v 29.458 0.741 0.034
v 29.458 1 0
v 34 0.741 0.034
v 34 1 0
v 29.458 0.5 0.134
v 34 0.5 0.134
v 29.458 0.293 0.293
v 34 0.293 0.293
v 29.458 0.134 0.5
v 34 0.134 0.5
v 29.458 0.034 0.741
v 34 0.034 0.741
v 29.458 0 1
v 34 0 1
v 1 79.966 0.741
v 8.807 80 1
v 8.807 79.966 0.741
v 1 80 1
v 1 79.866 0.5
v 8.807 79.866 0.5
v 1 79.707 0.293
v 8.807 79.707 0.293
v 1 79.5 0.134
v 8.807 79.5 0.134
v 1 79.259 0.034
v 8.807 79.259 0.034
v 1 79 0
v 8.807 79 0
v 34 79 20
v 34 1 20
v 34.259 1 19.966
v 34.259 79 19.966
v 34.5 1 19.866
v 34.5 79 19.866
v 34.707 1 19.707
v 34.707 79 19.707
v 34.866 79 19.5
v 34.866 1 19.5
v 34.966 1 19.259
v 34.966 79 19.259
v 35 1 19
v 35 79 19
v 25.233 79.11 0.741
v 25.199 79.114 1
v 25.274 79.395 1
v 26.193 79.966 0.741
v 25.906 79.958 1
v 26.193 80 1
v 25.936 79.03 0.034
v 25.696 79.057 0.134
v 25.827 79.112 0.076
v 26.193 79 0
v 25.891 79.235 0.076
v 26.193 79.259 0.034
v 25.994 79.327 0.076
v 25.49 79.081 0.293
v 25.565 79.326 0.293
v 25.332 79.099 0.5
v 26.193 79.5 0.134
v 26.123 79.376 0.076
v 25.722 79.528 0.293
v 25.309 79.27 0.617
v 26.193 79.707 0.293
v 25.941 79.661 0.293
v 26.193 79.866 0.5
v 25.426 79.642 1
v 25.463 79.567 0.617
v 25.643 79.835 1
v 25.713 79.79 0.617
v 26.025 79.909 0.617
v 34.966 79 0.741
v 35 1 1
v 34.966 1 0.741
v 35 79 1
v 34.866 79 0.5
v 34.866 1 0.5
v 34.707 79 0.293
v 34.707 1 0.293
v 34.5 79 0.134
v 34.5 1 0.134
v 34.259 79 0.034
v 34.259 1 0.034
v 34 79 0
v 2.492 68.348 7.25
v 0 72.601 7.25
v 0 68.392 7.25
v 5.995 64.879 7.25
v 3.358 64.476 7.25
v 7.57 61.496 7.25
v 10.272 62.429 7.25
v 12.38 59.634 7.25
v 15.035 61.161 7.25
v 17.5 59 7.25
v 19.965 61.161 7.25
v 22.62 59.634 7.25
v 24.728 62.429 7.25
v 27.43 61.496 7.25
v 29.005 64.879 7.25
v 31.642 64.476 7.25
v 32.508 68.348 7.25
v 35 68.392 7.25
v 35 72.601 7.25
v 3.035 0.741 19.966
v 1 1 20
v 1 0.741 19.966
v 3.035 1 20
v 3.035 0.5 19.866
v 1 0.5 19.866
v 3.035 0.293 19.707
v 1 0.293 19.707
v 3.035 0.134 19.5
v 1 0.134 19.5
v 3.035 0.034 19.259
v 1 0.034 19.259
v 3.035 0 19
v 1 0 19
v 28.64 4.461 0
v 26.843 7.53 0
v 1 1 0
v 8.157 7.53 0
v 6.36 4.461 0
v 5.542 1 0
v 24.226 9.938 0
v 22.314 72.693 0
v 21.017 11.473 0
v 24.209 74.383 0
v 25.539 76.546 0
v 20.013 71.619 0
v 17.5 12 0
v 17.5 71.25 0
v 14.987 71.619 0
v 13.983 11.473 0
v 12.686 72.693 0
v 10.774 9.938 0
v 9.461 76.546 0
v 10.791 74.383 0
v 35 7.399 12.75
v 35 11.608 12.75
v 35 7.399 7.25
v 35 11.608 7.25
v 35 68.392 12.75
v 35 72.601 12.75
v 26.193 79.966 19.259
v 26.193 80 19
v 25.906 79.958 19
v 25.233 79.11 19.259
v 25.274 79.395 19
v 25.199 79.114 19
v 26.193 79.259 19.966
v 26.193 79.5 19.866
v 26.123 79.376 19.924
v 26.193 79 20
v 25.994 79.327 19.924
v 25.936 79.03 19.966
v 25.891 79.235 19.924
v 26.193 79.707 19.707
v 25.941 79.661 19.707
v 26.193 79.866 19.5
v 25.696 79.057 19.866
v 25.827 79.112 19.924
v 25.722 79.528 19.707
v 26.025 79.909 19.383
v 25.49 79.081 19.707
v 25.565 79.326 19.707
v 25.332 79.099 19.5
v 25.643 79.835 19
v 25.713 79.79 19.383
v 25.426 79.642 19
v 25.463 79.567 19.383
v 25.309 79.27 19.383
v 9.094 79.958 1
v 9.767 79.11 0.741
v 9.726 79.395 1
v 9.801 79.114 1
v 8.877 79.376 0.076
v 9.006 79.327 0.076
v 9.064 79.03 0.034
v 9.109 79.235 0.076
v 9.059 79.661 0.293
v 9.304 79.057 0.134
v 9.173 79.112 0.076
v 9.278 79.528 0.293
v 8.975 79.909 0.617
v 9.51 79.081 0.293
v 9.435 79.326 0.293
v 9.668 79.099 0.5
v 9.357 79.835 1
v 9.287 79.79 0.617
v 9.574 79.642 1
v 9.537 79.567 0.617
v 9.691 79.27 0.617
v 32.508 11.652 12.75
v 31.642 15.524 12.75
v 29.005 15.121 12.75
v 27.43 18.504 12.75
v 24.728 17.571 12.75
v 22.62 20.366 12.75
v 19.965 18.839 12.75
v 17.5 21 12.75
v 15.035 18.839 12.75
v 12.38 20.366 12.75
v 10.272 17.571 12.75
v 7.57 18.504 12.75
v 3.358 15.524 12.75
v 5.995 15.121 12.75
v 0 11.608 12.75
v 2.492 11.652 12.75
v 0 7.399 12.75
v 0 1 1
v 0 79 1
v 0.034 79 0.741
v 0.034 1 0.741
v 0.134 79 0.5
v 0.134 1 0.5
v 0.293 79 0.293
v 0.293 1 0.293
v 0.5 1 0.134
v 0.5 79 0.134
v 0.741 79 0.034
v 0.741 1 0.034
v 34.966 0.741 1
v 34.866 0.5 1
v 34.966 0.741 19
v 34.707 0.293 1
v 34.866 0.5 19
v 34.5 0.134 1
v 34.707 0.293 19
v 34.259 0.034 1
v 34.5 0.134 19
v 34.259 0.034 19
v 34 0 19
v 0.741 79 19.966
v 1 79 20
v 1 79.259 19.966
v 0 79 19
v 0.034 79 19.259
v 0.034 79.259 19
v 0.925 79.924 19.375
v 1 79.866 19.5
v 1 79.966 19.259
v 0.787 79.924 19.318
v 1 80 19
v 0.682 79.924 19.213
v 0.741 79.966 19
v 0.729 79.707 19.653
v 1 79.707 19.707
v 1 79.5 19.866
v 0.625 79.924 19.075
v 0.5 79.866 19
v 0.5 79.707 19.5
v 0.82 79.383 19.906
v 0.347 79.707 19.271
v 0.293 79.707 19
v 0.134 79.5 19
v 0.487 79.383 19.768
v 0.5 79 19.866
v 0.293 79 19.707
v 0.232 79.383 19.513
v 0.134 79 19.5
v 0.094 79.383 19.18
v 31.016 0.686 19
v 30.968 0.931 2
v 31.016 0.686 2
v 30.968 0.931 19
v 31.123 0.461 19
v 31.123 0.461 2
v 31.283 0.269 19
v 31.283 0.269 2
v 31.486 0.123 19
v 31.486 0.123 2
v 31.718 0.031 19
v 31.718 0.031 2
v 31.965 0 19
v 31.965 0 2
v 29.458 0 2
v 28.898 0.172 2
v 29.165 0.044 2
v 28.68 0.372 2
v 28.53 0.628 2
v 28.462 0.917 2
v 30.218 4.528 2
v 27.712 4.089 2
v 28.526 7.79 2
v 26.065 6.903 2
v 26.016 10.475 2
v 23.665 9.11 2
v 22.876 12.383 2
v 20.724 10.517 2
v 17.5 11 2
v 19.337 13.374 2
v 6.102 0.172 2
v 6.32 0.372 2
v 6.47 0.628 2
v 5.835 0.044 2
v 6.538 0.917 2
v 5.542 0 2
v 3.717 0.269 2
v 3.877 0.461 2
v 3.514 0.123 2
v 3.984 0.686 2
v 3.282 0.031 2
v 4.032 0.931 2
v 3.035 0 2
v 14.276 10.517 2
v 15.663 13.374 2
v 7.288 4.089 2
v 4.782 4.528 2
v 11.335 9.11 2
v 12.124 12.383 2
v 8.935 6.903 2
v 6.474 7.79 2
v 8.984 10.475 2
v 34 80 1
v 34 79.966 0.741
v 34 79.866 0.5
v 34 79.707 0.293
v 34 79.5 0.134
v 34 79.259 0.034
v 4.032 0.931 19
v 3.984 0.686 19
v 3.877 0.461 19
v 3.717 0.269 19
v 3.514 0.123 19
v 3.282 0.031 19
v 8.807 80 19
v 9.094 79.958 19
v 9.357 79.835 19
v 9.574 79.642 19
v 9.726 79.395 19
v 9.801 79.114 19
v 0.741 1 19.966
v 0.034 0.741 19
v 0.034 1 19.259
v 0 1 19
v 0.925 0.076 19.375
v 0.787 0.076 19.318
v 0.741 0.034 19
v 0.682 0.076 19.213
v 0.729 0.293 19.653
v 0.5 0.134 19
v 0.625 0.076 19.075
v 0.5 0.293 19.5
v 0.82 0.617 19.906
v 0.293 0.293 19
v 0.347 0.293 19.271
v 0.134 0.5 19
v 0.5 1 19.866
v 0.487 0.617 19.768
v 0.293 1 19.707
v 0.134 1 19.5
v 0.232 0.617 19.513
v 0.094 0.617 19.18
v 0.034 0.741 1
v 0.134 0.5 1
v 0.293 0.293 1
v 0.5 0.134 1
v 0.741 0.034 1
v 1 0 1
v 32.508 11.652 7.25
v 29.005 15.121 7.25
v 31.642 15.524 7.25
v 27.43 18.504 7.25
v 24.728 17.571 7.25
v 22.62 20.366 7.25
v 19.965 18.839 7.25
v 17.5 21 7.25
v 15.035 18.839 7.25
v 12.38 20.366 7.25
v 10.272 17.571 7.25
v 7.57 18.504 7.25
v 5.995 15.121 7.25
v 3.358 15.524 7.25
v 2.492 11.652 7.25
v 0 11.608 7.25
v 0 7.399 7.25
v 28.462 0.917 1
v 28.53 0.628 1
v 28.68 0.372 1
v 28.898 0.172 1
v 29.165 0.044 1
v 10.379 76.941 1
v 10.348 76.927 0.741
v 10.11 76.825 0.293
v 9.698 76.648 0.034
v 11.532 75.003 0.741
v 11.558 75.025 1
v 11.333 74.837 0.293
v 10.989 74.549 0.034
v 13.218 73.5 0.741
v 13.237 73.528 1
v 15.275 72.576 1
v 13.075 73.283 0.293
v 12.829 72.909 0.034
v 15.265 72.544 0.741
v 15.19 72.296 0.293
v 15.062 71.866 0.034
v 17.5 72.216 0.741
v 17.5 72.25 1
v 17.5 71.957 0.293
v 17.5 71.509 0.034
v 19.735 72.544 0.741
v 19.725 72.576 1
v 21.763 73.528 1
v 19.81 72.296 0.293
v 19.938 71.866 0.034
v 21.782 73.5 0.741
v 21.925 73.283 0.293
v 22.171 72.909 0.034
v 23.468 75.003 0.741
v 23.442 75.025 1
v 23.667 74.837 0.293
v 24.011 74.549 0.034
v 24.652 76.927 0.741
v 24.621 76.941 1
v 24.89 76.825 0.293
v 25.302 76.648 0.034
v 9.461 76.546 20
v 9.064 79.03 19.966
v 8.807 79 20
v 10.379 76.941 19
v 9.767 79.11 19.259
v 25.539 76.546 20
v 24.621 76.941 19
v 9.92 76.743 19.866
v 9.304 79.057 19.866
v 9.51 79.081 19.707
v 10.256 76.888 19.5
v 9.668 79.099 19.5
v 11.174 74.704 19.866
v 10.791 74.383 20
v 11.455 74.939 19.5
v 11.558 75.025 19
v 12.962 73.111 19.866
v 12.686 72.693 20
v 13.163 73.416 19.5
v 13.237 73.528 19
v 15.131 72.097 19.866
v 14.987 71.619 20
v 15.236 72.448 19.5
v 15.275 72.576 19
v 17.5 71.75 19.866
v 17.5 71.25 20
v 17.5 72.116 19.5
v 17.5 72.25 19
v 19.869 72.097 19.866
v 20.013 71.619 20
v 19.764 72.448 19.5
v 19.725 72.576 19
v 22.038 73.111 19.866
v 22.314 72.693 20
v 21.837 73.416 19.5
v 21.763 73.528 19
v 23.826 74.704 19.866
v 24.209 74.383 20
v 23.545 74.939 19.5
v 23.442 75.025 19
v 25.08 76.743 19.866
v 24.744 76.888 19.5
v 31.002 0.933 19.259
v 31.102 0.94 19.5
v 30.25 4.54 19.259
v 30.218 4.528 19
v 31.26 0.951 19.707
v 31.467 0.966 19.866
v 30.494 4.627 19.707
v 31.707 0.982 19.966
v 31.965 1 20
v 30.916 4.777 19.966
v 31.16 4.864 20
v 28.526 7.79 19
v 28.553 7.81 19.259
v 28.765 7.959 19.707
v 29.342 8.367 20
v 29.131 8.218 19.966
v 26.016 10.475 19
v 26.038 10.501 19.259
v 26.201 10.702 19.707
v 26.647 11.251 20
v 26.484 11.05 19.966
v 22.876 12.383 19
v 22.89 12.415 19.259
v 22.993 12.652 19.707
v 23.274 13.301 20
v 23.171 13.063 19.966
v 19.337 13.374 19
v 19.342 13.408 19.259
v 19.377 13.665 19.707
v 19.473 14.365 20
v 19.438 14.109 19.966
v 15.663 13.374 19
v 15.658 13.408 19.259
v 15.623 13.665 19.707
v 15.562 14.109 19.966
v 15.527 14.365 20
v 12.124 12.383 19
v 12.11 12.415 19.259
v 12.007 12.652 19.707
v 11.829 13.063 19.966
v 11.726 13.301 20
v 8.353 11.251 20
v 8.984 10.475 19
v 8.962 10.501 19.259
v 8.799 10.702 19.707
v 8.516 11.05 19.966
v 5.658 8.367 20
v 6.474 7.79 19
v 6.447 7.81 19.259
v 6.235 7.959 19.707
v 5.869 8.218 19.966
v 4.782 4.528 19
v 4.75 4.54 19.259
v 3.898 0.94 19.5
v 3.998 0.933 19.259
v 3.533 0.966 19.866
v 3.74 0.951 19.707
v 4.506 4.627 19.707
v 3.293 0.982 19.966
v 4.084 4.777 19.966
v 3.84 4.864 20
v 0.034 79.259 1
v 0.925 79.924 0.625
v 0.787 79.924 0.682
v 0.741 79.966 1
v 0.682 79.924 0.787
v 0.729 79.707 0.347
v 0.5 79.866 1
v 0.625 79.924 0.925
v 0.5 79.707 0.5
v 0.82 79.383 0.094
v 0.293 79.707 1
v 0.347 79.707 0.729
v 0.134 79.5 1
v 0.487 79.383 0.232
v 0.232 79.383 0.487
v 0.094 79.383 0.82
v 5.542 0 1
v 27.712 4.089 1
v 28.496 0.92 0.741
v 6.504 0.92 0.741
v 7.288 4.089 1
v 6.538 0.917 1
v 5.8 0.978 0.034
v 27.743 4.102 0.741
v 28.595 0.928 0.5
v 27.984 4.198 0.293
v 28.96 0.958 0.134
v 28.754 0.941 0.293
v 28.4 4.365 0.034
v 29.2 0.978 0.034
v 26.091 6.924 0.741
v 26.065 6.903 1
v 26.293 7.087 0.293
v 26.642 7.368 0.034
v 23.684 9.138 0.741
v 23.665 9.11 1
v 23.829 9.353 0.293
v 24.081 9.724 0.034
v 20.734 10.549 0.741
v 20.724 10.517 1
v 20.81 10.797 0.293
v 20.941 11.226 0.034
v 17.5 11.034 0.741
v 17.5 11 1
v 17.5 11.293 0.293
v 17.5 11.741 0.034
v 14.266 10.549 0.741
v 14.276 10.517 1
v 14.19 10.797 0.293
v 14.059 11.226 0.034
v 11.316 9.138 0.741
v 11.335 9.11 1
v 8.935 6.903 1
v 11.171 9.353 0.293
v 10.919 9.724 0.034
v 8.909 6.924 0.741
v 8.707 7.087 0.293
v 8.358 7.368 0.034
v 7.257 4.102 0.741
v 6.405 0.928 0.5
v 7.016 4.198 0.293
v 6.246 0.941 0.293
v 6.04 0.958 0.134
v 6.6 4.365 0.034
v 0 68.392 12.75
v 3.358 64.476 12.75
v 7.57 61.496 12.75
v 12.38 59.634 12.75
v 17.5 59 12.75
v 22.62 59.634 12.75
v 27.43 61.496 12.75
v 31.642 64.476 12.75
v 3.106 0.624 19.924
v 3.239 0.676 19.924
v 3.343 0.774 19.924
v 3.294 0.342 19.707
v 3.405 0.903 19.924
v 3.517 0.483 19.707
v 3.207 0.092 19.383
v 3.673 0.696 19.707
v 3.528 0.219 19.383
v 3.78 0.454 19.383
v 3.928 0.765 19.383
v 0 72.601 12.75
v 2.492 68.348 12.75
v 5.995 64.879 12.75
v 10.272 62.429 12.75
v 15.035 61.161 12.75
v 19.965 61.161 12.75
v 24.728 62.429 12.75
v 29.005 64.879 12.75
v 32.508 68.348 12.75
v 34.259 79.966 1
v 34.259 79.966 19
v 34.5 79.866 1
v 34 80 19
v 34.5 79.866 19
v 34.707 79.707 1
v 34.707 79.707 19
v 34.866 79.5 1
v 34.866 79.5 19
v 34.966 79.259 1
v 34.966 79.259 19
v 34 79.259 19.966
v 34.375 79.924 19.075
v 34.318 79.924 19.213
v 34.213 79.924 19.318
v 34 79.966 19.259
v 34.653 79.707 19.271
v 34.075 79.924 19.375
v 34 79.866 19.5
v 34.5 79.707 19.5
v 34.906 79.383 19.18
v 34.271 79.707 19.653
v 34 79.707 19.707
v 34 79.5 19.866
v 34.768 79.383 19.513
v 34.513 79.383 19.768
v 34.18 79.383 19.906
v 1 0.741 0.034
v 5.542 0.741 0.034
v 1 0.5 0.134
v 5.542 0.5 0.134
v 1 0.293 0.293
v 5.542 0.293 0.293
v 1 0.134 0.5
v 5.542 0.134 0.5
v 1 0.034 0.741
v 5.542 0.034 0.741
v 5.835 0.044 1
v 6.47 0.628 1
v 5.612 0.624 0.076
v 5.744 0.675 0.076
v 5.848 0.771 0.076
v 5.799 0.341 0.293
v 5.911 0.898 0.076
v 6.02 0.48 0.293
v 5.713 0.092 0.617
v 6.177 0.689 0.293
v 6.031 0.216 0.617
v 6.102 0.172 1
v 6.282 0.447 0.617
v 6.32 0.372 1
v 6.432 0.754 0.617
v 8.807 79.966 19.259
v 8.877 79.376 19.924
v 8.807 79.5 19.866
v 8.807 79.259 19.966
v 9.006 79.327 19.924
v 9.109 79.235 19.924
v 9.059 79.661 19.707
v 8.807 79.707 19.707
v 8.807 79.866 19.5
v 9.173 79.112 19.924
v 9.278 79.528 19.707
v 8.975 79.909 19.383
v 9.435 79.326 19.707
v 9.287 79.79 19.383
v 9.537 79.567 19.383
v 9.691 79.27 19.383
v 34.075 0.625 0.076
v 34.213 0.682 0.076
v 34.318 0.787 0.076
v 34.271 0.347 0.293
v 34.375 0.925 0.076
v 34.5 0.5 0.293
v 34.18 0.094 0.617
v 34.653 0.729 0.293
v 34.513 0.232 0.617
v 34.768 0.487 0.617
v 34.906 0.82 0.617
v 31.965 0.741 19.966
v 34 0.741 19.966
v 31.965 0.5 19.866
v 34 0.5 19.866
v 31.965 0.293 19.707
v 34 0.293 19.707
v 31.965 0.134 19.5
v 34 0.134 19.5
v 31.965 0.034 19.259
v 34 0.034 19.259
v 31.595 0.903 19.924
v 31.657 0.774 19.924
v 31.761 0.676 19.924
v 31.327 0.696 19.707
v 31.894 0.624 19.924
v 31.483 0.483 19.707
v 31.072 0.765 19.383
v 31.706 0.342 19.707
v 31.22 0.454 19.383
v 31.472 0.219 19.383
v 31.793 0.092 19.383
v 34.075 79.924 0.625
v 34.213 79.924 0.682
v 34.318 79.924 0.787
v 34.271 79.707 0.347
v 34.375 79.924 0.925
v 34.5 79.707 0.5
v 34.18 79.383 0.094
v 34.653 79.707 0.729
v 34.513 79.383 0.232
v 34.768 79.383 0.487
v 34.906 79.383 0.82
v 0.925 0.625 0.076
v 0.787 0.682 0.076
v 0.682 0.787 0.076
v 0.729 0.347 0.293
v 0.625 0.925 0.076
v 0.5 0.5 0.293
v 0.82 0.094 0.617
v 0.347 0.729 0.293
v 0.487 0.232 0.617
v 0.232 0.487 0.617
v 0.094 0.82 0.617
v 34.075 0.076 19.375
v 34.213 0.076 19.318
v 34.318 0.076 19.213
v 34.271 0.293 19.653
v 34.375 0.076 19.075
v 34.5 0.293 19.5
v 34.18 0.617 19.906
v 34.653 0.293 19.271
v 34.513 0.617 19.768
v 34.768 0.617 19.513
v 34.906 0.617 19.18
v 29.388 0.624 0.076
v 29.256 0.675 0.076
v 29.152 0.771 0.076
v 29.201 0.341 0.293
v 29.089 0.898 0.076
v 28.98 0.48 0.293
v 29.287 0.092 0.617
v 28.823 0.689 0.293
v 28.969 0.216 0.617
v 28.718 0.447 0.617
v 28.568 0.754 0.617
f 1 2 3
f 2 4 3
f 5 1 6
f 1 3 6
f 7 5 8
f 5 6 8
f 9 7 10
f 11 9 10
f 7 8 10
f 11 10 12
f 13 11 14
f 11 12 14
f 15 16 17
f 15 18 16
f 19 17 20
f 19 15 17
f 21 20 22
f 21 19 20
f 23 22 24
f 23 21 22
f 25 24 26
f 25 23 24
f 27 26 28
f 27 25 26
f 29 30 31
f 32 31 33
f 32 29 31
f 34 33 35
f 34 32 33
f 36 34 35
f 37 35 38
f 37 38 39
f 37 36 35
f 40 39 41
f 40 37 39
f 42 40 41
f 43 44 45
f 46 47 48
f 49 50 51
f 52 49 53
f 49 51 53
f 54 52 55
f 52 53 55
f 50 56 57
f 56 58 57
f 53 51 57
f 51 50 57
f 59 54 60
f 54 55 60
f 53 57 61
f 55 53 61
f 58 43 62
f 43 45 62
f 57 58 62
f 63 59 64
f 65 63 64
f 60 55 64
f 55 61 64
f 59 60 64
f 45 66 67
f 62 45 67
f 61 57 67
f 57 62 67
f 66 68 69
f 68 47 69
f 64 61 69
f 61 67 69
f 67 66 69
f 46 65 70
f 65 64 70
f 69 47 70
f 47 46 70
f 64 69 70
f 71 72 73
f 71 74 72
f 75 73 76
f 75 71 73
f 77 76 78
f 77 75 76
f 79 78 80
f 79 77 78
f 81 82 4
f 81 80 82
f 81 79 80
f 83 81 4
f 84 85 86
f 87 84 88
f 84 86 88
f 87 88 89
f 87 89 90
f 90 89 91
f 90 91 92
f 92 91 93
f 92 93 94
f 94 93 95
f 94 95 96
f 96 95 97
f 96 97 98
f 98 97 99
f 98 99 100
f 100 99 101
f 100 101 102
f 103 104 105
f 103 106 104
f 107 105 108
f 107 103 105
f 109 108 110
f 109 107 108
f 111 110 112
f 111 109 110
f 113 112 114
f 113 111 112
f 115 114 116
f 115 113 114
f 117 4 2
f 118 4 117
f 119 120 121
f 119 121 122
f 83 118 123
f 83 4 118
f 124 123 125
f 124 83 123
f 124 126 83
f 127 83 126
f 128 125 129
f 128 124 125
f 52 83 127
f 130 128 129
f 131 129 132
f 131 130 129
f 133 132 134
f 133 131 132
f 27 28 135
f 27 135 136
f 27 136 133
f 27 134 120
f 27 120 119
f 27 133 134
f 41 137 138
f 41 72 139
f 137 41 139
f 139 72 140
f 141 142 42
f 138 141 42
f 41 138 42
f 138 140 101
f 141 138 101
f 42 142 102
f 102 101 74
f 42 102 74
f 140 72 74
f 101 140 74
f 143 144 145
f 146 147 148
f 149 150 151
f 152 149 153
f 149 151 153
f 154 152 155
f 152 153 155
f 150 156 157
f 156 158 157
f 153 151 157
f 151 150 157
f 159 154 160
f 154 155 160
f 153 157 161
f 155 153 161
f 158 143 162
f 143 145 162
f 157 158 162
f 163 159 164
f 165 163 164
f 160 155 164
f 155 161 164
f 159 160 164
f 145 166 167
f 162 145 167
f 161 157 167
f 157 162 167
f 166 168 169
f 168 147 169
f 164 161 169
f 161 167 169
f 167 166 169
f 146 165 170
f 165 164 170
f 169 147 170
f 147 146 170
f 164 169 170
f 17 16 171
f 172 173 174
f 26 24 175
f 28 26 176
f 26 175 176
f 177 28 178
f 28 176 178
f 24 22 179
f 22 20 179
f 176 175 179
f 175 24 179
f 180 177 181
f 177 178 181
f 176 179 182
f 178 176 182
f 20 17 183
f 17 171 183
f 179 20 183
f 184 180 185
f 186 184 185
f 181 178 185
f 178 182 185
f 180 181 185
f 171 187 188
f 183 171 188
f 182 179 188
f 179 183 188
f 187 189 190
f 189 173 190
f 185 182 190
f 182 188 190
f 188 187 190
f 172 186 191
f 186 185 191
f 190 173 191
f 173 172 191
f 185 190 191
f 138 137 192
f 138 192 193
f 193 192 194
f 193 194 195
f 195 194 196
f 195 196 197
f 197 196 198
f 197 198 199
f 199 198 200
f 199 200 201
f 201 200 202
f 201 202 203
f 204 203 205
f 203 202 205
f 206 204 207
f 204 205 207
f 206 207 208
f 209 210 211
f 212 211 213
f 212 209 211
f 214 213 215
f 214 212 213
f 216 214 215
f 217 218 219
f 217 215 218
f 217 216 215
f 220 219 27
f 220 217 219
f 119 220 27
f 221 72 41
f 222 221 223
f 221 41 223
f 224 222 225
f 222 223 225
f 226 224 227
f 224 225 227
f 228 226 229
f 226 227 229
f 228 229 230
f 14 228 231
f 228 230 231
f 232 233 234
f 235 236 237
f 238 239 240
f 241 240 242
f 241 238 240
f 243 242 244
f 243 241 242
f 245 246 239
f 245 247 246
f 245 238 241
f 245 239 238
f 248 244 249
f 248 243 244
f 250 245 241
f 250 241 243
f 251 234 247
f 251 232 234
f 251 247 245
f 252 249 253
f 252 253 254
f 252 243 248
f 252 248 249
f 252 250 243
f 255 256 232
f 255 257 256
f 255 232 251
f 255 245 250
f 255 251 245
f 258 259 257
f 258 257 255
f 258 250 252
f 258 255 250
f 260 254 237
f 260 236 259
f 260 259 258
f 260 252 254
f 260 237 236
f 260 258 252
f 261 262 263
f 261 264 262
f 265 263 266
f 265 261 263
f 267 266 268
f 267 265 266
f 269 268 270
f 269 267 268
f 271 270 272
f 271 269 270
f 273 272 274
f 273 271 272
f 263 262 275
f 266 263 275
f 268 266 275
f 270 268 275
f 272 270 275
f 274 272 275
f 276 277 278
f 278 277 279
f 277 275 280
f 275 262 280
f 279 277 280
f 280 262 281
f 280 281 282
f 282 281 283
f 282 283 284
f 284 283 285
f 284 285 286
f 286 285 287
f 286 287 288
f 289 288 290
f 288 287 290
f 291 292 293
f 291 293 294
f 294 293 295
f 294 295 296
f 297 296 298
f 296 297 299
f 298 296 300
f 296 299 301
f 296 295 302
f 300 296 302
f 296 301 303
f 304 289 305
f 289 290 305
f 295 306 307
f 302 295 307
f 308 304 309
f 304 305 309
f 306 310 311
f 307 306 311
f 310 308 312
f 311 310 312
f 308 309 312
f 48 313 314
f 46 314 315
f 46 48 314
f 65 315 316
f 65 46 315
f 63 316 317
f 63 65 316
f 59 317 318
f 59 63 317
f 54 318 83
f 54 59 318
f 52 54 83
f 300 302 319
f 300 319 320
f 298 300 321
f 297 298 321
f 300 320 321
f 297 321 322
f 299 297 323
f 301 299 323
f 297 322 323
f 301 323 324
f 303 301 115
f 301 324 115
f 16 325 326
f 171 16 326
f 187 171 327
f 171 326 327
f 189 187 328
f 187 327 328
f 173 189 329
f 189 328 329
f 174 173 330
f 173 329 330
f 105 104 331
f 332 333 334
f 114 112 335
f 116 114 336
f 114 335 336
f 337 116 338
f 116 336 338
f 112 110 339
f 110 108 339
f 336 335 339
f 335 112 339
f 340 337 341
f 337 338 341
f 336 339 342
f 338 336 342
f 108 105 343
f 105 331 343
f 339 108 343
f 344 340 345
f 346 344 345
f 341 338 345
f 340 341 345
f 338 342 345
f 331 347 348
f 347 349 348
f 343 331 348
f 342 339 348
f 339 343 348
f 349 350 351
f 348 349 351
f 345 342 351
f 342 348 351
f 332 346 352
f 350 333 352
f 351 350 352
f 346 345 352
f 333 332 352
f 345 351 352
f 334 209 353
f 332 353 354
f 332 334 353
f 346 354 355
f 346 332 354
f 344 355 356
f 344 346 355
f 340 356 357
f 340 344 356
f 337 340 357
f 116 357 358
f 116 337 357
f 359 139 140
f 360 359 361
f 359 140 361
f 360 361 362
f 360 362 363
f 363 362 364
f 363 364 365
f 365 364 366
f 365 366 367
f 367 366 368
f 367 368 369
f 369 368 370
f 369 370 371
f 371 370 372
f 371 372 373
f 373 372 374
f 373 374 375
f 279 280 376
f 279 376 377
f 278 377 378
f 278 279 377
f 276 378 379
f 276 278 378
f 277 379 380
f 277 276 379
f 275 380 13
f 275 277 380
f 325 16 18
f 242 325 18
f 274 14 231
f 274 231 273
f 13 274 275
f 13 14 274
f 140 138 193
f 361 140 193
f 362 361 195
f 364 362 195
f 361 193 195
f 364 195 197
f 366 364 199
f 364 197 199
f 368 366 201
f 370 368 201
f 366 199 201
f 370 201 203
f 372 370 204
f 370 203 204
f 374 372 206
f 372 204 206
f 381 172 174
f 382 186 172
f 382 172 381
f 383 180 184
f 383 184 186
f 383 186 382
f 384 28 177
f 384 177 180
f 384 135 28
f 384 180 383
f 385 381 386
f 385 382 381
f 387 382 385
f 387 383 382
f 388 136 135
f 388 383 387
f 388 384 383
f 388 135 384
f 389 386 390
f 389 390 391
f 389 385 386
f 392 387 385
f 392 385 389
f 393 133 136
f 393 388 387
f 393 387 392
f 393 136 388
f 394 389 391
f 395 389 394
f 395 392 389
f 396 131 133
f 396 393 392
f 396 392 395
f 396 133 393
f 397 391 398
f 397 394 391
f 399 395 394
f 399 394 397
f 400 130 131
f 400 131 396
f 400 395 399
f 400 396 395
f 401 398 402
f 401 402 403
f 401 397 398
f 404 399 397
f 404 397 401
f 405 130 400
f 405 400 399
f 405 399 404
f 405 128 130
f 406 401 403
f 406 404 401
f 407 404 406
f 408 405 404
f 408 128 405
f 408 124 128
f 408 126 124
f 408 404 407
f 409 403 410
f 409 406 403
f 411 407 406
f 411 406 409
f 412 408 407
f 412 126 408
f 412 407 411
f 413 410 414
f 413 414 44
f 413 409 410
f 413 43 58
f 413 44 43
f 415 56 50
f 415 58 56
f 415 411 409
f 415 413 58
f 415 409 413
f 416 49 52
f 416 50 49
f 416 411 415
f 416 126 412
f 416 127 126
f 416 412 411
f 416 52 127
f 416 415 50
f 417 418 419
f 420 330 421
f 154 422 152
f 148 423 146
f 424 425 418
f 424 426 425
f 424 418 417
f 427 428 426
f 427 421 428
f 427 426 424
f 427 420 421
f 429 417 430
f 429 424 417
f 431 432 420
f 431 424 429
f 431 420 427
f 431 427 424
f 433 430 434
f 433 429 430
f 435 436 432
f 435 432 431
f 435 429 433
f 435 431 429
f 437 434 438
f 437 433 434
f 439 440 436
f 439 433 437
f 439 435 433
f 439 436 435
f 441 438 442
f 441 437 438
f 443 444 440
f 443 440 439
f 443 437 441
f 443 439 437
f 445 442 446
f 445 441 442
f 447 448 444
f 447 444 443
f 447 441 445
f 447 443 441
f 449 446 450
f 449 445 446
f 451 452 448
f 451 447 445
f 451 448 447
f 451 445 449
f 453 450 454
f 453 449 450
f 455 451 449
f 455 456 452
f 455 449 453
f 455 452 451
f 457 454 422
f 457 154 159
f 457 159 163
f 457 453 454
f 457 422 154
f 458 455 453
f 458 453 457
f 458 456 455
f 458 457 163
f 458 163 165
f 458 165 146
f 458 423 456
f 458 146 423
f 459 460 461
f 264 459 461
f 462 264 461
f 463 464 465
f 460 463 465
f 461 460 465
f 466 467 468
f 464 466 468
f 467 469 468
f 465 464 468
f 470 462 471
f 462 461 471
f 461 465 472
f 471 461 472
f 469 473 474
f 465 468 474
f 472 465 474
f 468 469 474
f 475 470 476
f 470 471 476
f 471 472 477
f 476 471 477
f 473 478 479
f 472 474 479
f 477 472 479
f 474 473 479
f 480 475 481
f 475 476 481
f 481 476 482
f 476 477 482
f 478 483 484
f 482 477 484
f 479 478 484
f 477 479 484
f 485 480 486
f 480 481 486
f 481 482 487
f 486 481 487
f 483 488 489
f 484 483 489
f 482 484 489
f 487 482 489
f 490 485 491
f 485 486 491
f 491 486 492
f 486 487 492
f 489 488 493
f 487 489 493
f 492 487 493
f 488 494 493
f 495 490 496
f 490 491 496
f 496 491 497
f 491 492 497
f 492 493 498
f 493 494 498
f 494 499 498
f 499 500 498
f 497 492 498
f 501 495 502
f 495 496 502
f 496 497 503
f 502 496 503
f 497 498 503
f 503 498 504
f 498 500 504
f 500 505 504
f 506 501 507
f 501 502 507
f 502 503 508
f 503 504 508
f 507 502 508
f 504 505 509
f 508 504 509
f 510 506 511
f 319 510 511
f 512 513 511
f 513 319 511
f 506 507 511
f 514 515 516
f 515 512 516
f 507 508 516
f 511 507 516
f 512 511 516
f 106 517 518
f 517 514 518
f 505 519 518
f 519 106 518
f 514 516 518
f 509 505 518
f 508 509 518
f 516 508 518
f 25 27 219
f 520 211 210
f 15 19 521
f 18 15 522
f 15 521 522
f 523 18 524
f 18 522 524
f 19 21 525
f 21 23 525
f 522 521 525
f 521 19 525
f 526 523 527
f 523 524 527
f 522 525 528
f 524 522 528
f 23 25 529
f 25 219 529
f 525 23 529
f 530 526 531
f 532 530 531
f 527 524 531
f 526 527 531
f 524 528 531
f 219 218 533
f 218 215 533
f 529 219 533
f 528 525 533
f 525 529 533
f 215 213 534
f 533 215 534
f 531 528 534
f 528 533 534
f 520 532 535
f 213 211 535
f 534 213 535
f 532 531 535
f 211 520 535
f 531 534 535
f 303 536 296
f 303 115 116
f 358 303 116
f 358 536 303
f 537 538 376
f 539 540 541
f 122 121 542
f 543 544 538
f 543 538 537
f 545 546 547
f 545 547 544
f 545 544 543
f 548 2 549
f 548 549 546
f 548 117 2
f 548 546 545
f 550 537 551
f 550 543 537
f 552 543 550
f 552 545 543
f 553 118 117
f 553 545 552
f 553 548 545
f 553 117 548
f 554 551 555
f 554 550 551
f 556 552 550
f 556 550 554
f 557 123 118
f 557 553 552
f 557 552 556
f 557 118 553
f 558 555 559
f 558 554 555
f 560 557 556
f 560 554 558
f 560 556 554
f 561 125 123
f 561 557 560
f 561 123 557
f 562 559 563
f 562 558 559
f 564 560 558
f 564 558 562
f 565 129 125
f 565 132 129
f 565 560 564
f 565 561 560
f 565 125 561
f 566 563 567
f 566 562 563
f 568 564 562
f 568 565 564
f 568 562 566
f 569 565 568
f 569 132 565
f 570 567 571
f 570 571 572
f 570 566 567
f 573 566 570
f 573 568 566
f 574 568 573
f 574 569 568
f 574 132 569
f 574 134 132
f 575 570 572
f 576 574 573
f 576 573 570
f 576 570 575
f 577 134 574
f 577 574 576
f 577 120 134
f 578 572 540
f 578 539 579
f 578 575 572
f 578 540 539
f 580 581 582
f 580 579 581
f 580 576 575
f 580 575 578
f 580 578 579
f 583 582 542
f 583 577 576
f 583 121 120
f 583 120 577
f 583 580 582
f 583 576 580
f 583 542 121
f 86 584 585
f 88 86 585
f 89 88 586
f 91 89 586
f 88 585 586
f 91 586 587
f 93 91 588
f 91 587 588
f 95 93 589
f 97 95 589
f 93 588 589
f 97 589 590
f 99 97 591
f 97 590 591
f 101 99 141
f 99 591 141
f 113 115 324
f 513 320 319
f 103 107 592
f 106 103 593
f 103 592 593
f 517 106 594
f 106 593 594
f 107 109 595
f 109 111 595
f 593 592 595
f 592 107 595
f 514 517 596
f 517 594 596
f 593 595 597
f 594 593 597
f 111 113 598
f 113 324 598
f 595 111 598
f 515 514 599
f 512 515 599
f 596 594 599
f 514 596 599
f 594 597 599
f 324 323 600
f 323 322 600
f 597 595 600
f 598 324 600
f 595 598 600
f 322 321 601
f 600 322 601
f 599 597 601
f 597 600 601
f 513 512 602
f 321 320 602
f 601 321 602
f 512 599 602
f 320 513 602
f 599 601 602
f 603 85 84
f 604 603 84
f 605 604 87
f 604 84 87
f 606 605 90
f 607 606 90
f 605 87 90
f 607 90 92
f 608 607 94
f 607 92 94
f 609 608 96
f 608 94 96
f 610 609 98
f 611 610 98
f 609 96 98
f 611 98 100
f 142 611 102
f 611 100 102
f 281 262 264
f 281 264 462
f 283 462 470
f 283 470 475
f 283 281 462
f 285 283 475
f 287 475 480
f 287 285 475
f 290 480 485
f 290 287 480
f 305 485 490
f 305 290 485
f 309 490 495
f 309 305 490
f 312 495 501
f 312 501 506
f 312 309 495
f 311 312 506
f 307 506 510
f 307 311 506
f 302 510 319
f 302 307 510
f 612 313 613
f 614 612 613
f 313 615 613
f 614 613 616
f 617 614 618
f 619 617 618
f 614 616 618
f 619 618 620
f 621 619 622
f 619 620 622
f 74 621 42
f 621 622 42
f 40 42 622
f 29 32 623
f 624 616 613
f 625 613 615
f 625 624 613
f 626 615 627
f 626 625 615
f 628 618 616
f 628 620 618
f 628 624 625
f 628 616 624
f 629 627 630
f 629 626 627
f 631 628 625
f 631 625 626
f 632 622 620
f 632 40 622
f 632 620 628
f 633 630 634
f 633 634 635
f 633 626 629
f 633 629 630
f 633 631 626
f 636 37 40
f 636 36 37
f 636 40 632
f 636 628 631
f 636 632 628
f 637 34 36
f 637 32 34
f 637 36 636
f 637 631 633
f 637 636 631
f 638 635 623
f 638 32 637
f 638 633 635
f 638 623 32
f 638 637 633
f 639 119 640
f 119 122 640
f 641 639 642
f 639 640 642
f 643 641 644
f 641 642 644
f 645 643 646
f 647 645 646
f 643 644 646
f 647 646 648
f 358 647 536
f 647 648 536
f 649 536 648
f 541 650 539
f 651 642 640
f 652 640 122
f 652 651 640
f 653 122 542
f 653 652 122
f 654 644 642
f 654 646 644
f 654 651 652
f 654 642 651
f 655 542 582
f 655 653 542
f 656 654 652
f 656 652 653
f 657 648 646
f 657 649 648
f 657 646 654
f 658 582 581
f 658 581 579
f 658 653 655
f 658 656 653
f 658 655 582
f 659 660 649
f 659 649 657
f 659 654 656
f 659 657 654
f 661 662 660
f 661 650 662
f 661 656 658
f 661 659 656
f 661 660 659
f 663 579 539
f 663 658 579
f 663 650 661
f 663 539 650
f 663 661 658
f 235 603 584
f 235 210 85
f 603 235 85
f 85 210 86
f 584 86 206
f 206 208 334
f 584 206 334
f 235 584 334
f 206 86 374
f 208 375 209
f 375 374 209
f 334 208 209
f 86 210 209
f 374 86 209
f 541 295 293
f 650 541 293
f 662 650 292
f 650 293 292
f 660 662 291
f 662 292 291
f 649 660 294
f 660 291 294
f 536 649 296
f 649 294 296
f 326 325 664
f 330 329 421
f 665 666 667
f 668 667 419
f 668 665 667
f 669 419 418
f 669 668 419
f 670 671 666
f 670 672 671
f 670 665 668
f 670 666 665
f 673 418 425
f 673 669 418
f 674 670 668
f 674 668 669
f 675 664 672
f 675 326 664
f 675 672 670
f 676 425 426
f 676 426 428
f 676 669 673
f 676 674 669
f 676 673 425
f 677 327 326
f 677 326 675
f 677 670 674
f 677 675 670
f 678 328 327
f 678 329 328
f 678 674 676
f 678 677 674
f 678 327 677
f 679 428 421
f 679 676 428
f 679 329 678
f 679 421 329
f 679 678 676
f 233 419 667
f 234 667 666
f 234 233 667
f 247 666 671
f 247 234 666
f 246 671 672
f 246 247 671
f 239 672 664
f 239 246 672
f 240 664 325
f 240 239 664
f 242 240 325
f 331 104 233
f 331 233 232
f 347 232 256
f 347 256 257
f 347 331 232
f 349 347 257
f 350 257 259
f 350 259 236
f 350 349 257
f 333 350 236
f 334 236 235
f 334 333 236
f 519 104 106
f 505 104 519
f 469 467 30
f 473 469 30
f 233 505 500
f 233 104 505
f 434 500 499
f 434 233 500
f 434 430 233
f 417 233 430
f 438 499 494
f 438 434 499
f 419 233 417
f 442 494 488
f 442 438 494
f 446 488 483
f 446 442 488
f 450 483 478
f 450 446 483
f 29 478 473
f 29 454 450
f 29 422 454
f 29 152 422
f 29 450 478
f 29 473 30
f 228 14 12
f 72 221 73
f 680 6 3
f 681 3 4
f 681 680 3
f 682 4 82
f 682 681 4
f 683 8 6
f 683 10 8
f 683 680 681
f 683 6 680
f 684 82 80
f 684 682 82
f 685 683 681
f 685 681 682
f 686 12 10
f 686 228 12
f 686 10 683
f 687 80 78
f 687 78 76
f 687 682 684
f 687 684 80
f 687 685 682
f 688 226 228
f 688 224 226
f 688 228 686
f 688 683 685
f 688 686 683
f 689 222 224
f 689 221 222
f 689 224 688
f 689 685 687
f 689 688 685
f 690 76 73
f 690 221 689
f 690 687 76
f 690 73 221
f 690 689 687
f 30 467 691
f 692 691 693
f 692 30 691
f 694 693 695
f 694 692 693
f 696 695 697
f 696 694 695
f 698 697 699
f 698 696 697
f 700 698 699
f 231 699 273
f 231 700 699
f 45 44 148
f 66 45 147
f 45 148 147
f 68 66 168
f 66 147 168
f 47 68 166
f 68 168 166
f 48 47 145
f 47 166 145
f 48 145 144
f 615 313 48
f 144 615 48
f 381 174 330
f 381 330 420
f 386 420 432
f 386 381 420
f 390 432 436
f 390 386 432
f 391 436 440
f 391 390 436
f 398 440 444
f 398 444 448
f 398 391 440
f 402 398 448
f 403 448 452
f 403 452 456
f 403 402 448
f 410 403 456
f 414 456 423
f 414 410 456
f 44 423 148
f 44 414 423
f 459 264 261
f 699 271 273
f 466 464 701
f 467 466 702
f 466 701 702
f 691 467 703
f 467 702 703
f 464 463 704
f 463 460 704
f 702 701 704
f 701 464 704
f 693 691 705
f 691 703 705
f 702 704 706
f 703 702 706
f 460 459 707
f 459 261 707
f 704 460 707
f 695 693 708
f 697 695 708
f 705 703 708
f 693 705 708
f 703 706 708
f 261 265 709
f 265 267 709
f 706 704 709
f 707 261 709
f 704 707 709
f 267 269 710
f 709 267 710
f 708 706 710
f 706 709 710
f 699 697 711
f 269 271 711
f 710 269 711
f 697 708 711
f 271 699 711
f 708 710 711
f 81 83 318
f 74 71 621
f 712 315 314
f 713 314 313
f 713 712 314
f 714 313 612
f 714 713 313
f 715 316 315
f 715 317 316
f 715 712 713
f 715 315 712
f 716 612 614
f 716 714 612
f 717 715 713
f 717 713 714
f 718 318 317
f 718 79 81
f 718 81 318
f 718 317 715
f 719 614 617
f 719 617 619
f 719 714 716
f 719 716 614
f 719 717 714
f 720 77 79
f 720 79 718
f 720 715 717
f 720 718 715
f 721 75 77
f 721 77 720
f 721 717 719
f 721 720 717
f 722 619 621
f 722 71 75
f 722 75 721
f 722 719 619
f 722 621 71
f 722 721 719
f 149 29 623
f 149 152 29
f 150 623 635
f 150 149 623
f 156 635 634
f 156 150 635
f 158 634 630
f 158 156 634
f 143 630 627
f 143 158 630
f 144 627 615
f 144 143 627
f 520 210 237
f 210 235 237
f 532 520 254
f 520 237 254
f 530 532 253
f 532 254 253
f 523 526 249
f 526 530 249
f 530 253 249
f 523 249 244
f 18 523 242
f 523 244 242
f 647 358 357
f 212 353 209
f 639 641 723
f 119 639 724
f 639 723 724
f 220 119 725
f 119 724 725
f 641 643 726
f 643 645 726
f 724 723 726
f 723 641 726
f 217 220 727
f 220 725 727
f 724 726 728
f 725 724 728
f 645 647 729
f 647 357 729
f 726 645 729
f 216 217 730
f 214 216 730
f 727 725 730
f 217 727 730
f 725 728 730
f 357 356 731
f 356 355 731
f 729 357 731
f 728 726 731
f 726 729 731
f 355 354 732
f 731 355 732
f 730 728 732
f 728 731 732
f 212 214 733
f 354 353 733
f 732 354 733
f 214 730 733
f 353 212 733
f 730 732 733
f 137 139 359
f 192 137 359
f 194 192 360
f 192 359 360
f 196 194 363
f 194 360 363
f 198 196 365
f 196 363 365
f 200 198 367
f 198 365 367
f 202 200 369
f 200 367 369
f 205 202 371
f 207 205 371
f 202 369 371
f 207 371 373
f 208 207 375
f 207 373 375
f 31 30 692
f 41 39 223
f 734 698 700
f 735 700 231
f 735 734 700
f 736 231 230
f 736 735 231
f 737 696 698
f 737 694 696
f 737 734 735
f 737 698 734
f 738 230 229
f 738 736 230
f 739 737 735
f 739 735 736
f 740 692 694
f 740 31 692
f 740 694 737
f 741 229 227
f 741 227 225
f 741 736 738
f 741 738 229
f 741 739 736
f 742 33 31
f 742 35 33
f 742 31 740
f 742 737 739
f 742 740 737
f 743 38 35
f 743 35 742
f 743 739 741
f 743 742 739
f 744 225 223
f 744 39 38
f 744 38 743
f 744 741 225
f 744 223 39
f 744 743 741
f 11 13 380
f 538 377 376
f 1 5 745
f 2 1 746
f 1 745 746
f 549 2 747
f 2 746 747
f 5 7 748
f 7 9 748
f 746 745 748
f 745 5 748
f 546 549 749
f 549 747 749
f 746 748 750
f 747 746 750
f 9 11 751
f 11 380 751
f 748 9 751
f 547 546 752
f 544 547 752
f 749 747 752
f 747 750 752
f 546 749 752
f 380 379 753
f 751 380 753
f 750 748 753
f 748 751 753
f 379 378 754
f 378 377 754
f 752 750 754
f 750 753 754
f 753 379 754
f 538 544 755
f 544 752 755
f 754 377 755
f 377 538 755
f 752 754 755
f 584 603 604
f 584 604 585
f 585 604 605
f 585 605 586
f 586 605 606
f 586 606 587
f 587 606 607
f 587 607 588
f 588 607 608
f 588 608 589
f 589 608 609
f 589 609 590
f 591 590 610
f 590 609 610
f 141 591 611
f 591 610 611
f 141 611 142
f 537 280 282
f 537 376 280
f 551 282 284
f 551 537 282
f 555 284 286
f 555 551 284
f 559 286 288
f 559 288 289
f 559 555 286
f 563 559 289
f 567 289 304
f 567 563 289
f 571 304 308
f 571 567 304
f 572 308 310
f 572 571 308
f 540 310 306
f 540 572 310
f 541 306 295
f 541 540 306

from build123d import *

# Parameters (mm, degrees)
PAD_DEPTH    = 20
SKETCH002_W  = 2
SKETCH002_H  = 5.5
SKETCH004_W  = 2
SKETCH004_H  = 5.5
PAD001_DEPTH = 2
FILLET_R     = 1


with BuildPart() as part:
    # Sketch → Pad (new body)
    with BuildSketch(Plane.XY):
        with BuildLine():
            Line((0, 0), (4, 0))
            ThreePointArc((31, 0), (17.5, 13.5), (4, 0))
            Line((31, 0), (35, 0))
            Line((35, 0), (35, 80))
            Line((35, 80), (25.25, 80))
            ThreePointArc((9.75, 80), (17.5, 72.25), (25.25, 80))
            Line((9.75, 80), (0, 80))
            Line((0, 80), (0, 0))
        make_face()
    extrude(amount=PAD_DEPTH)

    # SubtractivePipe: sweep along a path in Sketch001
    with BuildLine(Plane.XY.offset(10)) as subtractivepipe_path:
        CenterArc((17.5, 0), 20, 0, 360)
    # Sketch002 → SubtractivePipe (sweep, cut)
    with BuildSketch(Plane.XZ):
        with Locations((37.5, 10)):
            Rectangle(SKETCH002_W, SKETCH002_H)
    sweep(path=subtractivepipe_path.line, mode=Mode.SUBTRACT)

    # SubtractivePipe001: sweep along a path in Sketch003
    with BuildLine(Plane.XY.offset(10)) as subtractivepipe001_path:
        CenterArc((17.5, 80), 20, 0, 360)
    # Sketch004 → SubtractivePipe001 (sweep, cut)
    with BuildSketch(Plane.XZ.offset(-80)):
        with Locations((37.5, 10)):
            Rectangle(SKETCH004_W, SKETCH004_H)
    sweep(path=subtractivepipe001_path.line, mode=Mode.SUBTRACT)

    # Sketch005 → Pad001 (join)
    with BuildSketch(Plane.XY):
        with BuildLine():
            ThreePointArc((28.5, 0), (17.5, 11), (6.5, 0))
            Line((6.5, 0), (4, 0))
            ThreePointArc((31, 0), (17.5, 13.5), (4, 0))
            Line((31, 0), (28.5, 0))
        make_face()
    extrude(amount=PAD001_DEPTH)

    # Fillet
    fillet_edges = [part.edges().sort_by_distance(p)[0] for p in [
        (0, 40, 20),
        (35, 40, 20),
        (2, 0, 20),
        (17.5, 13.5, 20),
        (33, 0, 20),
        (4, 0, 11),
        (0, 0, 10),
        (31, 0, 11),
        (35, 0, 10),
        (3.25, 0, 0),
        (31.75, 0, 0),
        (35, 40, 0),
        (17.5, 11, 0),
        (0, 40, 0),
        (4.875, 80, 0),
        (17.5, 72.25, 0),
        (30.125, 80, 0),
        (35, 80, 10),
        (25.25, 80, 10),
        (9.75, 80, 10),
        (30.125, 80, 20),
        (4.875, 80, 20),
        (17.5, 72.25, 20),
        (0, 80, 10),
        (28.5, 0, 1),
        (6.5, 0, 1),
    ]]
    fillet(fillet_edges, radius=FILLET_R)


solid = part.part
